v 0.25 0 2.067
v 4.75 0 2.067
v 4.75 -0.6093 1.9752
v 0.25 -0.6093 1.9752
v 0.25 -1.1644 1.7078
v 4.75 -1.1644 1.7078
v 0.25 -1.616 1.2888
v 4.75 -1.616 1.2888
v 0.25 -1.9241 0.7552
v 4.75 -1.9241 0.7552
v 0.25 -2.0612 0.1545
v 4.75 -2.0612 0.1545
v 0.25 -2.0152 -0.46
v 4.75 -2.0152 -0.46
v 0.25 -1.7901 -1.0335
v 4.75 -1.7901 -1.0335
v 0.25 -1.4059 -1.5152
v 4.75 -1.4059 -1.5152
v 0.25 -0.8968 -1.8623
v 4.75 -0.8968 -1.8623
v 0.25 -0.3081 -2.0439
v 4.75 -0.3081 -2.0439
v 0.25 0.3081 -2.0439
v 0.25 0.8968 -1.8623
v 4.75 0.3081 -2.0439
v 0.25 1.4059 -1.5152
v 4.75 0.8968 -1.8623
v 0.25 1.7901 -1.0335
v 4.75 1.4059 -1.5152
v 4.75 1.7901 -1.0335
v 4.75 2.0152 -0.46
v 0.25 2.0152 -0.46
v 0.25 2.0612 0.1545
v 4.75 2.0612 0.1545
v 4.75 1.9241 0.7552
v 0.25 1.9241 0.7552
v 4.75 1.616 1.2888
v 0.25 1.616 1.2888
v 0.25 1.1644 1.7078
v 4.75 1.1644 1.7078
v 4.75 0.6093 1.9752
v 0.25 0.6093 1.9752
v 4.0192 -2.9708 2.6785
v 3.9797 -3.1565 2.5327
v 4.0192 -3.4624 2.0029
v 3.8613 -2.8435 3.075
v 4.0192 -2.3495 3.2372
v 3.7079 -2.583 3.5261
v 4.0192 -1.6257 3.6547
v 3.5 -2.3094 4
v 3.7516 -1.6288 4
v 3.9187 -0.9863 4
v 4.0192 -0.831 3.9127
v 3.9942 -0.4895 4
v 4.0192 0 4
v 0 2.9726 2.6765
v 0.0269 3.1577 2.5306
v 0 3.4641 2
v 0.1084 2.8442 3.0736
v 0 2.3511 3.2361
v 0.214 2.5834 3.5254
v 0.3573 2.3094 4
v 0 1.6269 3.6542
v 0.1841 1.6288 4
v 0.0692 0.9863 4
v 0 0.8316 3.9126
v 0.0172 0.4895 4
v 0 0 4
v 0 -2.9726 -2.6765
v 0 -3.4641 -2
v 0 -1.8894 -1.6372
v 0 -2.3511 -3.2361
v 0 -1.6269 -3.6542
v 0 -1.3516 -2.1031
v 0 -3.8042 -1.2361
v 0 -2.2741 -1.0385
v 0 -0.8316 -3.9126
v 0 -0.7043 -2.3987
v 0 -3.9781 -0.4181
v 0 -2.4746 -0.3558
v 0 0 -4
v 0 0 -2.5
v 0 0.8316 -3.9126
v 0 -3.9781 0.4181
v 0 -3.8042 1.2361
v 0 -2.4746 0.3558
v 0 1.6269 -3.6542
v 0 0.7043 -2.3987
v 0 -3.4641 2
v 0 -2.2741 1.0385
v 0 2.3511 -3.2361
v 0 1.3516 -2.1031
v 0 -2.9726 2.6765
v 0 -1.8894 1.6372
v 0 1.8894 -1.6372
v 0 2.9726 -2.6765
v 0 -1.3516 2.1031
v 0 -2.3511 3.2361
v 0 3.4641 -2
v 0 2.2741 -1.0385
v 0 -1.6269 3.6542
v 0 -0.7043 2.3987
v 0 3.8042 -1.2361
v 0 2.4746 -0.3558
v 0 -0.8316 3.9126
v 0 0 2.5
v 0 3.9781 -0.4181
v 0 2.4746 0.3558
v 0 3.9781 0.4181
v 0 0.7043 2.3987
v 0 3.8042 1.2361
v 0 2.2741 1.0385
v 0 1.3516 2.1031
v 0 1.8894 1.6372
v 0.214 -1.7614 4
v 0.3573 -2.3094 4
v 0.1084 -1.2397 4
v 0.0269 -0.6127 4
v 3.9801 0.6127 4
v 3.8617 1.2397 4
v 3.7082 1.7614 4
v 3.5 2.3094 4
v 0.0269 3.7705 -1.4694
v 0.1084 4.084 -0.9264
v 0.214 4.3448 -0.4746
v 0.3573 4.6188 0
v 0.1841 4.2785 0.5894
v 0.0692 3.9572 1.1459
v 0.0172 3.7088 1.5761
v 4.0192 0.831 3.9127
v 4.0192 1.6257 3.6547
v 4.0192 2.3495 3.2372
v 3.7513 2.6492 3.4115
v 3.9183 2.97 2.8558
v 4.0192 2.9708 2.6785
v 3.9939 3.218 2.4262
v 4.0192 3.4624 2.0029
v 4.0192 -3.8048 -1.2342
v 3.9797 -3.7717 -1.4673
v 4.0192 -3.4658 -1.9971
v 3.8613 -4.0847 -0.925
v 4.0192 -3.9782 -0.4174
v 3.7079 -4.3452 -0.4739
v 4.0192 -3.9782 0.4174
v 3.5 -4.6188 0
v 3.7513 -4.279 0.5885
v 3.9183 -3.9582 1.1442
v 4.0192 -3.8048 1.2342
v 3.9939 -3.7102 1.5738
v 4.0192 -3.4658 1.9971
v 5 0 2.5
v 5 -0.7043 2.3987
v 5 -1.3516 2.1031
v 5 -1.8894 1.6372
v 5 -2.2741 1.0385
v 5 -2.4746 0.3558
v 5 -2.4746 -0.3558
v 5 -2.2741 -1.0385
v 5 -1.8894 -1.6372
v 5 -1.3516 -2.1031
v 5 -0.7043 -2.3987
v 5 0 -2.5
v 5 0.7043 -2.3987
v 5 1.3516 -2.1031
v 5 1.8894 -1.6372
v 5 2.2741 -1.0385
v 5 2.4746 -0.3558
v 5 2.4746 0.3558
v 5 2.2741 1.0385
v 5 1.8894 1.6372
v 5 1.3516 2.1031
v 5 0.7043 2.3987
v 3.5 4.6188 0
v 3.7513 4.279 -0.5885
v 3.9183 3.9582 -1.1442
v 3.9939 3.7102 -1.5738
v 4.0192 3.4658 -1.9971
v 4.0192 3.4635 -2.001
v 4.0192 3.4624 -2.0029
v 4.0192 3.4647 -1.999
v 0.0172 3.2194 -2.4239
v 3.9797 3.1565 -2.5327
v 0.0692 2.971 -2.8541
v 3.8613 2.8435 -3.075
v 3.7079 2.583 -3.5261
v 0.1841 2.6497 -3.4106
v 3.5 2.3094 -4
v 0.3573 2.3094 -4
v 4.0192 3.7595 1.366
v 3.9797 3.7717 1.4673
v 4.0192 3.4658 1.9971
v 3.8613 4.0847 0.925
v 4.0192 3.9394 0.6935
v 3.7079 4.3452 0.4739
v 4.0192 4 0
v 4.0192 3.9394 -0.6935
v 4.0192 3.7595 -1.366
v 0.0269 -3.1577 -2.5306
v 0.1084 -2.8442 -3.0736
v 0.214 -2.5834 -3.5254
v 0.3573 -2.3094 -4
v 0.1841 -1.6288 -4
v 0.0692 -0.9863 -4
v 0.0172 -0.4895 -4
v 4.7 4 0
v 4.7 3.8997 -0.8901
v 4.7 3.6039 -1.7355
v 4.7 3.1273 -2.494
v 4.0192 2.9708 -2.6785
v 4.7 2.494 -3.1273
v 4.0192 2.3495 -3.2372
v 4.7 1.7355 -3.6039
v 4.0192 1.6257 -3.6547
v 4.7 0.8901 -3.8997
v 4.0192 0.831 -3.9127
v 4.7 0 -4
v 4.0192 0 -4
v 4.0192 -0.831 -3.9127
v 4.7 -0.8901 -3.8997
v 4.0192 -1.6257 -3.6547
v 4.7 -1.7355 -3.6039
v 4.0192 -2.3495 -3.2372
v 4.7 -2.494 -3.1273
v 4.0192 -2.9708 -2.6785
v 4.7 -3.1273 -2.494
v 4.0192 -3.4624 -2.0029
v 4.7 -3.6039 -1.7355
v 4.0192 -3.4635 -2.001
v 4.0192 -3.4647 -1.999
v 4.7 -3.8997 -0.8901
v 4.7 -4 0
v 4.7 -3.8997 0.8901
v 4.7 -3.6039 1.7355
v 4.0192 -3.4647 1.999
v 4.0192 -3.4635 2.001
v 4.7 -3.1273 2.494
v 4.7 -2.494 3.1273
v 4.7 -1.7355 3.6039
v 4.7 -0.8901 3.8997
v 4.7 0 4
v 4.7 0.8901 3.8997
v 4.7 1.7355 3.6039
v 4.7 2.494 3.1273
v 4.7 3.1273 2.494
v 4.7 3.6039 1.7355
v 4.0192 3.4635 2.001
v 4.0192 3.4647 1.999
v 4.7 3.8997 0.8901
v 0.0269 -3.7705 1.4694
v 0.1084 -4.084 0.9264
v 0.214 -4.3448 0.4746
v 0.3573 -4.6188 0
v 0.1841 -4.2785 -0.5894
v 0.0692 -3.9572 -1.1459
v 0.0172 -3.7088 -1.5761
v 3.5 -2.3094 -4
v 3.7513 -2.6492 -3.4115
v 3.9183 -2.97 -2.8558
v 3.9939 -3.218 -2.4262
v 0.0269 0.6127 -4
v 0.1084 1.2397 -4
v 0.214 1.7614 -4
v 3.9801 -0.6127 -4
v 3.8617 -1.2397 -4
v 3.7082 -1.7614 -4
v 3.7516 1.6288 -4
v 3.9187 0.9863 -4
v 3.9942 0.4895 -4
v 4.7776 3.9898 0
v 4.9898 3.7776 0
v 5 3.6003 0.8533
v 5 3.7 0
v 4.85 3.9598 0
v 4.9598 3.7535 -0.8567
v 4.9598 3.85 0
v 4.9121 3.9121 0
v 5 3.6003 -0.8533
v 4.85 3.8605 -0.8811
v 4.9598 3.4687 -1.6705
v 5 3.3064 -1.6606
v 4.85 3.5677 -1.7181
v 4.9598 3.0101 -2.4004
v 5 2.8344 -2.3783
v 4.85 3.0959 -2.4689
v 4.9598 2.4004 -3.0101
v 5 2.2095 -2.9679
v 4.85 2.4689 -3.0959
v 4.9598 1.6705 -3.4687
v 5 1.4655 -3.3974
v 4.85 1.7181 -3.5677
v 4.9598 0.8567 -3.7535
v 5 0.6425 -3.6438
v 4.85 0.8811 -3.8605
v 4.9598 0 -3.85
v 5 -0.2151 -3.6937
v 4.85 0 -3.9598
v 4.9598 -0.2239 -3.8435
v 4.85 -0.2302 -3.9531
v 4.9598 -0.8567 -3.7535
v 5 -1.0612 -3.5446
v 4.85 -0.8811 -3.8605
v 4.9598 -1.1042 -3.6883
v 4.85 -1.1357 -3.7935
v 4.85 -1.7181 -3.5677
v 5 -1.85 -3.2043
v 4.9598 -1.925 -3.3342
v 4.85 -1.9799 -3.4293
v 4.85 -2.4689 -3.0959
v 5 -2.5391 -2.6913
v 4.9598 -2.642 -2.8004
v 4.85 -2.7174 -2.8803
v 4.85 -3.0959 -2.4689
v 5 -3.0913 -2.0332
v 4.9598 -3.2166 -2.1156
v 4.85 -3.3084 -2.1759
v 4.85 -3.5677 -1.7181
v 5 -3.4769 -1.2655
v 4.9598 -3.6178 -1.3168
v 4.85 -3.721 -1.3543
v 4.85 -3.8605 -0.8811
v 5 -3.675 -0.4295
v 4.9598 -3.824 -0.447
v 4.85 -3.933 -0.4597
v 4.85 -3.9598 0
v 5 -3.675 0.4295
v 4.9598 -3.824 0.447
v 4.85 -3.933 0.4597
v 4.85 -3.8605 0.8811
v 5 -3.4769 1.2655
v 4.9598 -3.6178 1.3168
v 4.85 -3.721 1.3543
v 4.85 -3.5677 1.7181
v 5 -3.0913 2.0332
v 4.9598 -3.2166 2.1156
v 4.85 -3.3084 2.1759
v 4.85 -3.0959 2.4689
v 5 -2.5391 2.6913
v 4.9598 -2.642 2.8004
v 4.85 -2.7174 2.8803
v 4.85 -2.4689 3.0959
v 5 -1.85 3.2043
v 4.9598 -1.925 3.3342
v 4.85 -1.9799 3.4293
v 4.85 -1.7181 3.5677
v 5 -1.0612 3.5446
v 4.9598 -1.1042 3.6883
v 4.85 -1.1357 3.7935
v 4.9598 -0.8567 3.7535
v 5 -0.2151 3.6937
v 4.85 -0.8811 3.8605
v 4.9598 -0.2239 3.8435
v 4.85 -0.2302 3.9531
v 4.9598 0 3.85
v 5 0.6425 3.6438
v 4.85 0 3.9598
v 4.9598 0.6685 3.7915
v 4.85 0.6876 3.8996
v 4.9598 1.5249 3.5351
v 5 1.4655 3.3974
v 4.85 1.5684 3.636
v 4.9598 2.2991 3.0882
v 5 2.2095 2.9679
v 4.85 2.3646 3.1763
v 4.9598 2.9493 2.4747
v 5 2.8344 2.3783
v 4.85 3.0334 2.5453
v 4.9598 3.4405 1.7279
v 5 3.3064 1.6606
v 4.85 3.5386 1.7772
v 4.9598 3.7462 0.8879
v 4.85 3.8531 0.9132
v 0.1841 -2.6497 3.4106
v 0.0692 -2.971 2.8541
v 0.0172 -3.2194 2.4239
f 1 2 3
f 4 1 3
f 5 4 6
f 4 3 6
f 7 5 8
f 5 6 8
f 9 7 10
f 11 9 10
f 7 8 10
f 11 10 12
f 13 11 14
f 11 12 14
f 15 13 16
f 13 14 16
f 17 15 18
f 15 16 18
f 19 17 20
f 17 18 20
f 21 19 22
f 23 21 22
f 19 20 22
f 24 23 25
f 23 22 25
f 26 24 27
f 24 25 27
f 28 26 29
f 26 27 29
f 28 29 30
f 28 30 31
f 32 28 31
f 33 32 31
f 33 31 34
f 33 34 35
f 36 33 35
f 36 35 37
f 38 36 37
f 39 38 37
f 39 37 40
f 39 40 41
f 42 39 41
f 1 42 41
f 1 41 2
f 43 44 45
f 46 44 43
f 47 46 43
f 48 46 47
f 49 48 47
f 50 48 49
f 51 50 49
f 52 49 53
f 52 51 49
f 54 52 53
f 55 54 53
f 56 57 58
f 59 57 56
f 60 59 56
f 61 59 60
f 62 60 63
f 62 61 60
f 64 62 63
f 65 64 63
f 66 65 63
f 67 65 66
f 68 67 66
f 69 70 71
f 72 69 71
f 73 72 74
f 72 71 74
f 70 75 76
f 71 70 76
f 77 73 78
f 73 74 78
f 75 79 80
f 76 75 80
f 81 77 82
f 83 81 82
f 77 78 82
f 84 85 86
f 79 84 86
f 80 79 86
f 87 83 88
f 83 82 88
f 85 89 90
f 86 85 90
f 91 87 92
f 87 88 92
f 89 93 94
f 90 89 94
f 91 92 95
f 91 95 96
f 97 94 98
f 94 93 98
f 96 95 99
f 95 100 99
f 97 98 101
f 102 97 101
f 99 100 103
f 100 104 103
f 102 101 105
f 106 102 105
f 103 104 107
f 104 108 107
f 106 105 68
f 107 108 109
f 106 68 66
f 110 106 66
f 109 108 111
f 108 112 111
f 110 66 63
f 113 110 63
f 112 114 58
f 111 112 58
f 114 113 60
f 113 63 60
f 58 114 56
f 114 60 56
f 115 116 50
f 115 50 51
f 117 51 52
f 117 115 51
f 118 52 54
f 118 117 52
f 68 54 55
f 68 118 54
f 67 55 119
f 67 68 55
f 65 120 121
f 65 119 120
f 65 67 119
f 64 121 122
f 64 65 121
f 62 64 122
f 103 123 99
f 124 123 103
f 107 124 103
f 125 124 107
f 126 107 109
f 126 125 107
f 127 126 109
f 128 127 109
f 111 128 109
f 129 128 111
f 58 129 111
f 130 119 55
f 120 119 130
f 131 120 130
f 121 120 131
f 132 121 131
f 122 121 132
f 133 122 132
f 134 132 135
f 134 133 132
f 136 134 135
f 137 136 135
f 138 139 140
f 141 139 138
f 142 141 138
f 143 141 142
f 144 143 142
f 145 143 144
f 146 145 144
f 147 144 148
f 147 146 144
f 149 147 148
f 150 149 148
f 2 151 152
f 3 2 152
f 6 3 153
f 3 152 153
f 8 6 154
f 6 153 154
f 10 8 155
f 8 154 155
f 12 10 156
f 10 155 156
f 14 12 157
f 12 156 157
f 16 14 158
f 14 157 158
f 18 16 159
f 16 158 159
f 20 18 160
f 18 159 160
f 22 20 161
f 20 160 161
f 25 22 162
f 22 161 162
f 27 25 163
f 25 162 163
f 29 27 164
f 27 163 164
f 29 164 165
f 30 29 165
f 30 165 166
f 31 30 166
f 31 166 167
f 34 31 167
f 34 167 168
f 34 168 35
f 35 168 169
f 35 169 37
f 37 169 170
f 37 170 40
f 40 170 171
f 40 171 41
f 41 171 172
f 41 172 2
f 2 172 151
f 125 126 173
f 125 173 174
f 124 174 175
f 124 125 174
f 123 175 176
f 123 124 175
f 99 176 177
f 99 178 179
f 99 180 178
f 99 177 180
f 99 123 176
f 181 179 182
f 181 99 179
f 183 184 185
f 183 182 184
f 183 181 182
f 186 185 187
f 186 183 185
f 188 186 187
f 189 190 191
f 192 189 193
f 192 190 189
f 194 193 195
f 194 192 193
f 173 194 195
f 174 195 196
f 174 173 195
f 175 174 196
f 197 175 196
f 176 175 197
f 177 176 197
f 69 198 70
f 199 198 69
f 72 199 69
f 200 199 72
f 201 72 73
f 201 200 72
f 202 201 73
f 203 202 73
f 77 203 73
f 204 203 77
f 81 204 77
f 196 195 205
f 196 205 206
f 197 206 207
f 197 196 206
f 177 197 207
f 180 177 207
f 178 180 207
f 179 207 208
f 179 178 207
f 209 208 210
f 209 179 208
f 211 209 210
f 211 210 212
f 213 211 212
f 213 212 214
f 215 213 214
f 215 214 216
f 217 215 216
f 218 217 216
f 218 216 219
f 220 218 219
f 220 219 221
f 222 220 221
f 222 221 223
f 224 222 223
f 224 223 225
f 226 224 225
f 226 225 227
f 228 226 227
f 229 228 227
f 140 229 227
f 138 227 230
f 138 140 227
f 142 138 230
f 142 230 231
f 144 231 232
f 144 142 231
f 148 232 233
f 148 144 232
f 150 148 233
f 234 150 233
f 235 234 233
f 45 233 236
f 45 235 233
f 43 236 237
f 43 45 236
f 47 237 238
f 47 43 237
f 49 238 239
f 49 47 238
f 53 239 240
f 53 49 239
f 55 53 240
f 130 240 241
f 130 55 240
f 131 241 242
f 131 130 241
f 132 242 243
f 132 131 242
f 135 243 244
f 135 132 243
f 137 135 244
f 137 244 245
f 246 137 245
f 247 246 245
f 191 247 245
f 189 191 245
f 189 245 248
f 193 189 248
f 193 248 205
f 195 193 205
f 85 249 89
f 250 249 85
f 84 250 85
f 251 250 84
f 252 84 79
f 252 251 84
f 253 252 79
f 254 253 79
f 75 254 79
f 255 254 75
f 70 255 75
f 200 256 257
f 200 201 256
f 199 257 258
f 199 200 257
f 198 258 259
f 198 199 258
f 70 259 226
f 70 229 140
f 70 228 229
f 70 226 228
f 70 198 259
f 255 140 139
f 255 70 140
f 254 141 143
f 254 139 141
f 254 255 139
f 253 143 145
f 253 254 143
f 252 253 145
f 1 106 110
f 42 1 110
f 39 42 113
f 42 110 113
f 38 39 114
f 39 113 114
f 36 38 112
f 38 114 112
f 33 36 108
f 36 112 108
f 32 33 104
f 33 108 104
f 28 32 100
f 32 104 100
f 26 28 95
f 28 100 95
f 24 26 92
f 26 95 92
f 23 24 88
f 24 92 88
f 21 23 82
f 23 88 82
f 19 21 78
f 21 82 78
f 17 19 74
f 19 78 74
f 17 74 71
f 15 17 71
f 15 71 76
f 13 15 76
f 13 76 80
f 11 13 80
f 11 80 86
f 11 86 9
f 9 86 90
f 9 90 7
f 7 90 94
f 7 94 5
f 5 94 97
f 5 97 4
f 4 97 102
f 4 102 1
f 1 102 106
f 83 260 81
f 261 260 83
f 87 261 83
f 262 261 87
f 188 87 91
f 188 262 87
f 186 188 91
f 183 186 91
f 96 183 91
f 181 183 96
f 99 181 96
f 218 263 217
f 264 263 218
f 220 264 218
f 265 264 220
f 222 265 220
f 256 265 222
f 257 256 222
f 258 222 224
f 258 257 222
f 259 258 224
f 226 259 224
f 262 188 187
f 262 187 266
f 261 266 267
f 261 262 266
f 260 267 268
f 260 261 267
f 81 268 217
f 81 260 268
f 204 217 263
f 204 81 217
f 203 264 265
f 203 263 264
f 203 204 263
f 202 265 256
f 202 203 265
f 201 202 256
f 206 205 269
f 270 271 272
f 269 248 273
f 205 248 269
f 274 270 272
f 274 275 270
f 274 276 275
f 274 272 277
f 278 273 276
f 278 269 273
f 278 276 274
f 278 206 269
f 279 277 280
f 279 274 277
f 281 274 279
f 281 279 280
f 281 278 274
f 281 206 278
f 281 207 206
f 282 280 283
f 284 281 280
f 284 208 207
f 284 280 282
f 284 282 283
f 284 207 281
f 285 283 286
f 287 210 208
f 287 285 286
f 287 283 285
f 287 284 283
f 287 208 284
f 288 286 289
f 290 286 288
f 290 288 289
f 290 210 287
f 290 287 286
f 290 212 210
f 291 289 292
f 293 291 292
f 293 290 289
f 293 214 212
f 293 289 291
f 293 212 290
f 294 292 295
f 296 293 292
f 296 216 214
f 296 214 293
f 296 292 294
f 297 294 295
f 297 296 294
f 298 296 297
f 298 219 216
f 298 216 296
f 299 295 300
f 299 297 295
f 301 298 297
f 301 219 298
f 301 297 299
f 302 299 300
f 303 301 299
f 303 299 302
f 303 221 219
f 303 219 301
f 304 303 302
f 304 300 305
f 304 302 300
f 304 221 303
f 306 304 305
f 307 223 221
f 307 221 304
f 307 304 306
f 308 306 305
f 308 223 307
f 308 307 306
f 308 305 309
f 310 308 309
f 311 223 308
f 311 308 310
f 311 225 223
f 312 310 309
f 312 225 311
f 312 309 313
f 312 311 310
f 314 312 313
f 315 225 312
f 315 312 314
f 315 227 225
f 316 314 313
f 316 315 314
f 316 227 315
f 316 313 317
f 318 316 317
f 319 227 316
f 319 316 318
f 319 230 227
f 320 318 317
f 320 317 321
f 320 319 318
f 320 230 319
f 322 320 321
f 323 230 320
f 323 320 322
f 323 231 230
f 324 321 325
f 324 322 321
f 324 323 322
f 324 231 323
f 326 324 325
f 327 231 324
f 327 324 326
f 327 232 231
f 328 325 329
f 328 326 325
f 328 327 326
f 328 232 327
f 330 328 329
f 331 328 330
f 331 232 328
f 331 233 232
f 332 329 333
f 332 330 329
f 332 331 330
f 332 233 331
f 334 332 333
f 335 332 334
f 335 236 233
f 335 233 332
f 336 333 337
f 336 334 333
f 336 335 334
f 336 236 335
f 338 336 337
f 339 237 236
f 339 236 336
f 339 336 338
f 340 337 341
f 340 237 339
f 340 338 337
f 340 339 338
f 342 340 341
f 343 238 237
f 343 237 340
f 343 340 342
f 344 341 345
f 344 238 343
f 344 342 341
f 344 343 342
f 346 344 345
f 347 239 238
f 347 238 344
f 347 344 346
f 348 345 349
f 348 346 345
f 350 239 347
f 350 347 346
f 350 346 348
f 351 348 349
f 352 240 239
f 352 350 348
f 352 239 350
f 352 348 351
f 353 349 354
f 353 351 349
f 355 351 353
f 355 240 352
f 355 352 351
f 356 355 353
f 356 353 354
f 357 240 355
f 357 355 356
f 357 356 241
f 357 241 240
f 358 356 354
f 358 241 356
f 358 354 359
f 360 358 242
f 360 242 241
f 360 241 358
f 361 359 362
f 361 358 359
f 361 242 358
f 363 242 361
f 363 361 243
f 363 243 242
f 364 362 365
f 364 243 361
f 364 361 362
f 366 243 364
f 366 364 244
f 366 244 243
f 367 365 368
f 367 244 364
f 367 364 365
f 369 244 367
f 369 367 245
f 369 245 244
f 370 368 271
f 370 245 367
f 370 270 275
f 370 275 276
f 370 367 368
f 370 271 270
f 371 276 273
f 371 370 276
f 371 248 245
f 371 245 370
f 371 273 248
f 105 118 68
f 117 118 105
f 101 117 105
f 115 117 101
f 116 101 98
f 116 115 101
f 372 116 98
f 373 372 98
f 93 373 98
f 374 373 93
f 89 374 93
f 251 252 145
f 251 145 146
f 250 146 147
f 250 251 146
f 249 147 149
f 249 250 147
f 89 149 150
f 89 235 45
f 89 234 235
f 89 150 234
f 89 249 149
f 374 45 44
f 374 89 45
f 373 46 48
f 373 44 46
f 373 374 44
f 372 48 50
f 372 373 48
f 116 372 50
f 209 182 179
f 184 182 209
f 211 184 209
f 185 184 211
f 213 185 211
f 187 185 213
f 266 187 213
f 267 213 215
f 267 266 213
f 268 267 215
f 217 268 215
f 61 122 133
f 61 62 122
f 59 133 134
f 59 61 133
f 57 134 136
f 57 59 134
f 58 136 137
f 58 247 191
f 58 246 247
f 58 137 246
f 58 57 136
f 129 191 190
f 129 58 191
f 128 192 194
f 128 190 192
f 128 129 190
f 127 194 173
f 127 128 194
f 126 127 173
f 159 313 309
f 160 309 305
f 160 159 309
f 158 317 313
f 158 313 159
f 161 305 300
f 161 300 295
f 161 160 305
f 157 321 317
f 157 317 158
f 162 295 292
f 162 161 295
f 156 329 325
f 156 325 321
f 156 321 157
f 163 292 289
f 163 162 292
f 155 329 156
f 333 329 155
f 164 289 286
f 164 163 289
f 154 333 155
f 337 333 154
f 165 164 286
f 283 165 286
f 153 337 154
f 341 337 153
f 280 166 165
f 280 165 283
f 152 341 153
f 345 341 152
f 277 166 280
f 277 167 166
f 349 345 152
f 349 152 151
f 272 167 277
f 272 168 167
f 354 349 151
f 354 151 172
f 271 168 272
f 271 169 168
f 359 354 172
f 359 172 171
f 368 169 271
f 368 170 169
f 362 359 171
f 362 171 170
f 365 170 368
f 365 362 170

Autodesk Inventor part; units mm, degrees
ref_plane "YZ Plane" through (0, 0, 0) normal (1, 0, 0) x (0, 1, 0)
ref_plane "XZ Plane" through (0, 0, 0) normal (0, 1, 0) x (-1, 0, 0)
sketch "Sketch1" plane through (0, 0, 0) normal (1, 0, 0) x (0, 1, 0)
  line L0 (-4.6188, 0) -> (-2.3094, 4)
  line L1 (-2.3094, 4) -> (2.3094, 4)
  line L2 (2.3094, 4) -> (4.6188, 0)
  line L3 (4.6188, 0) -> (2.3094, -4)
  line L4 (2.3094, -4) -> (-2.3094, -4)
  line L5 (-2.3094, -4) -> (-4.6188, 0)
  point P0 (0, 0)
  point P1 (0, 0)
  dimension "d0" = 9.2376
extrude "Body" add sketch "Sketch1" along normal blind 5
sketch "Sketch2" plane through (0, 0, 0) normal (-1, 0, 0) x (0, 0, 1)
  line L0 (0, -6.4663) -> (0, 6.4663) projected
  line L1 (-5.6, 0) -> (5.6, 0) projected
  point P0 (0, 0)
hole "Thread" at (0, 0, 0) direction (1, 0, 0) diameter 4.134 end through all thread size "M5x0.8" class "6H" standard "ANSI Metric M Profile"
chamfer "Chamfer1" distance 0.433 angle 30 1 edges at (0, 0, -2.067) measured on face at (0, -2.8764, -1.7247)
chamfer "Chamfer2" distance 0.433 angle 30 1 edges at (5, 0, -2.067) measured on face at (5, -2.8764, -1.7247)
sketch "Sketch3" plane through (0, 0, 0) normal (0, 0, 1) x (1, 0, 0)
  line L0 (0, 2.3094) -> (0, 4.6188) projected
  line L1 (0, 4.6188) -> (5, 4.6188) projected
  line L2 (5, 2.3094) -> (5, 4.6188) projected
  line L3 (-1.36, 0) -> (8.16, 0) projected
  line L4 (0.3573, 4.6188) -> (0, 4)
  line L5 (5, 4) -> (4.0192, 4)
  line L6 (4.0192, 4) -> (3.5, 4.6188)
  line L7 (13.2445, 4.6188) -> (17.2445, 2.3094) construction
  line L8 (17.2445, 2.3094) -> (17.2445, -2.3094) construction
  line L9 (17.2445, -2.3094) -> (13.2445, -4.6188) construction
  line L10 (13.2445, -4.6188) -> (9.2445, -2.3094) construction
  line L11 (9.2445, -2.3094) -> (9.2445, 2.3094) construction
  line L12 (9.2445, 2.3094) -> (13.2445, 4.6188) construction
  circle A0 centre (13.2445, 0) radius 4 construction
  line L13 (13.2445, 4) -> (5, 4) construction
  dimension "d3" = 30
  dimension "d5" = 8
  dimension "d8" = 40
  dimension "d9" = 3.5
  dimension "d43" = 8.2445
revolve "Chamfer3" cut sketch "Sketch3" angle 360 about axis through (-10, 0, 0) along (1, 0, 0)
ref_plane "Work Plane1" through (13.2035, 0, 0) normal (0, 0, 1) x (-1, 0, 0)
fillet "Fillet1" radius 0.3 1 edges at (5, -4, 0)
equation "\"d0\" = 1.1547 * SW"
equation "\"d3\" = ANG1"
equation "\"d5\" = SW0"
equation "\"d10\" = -0.5 * GD1 + 0.5 * NND"
equation "\"d39\" = -0.5 * GD1 + 0.5 * NND"
equation "\"d12\" = -0.5 * GD1 + 0.5 * NND"
equation "\"d40\" = -0.5 * GD1 + 0.5 * NND"
equation "\"ANG1\" = 30deg"
equation "\"ANG2\" = 60deg"
equation "\"NND\" = 5"
equation "\"KOH\" = 6.8"
equation "\"SW\" = 8"
equation "\"SW0\" = SW"
equation "\"SW1\" = 0.85 * SW"
equation "\"KOH1\" = 2.7"
equation "\"GUL\" = 0.541266 * PTC"
equation "\"THREADDIA\" = 5"
equation "\"TOA\" = 30deg"
equation "\"PTC\" = 0.8"
equation "\"E0\" = 1.155 * SW"
equation "\"GAL\" = 0.541266 * PTC"
equation "\"GD1\" = 4.133975"
properties part number "ParlocM5" material "Steel, Mild"
